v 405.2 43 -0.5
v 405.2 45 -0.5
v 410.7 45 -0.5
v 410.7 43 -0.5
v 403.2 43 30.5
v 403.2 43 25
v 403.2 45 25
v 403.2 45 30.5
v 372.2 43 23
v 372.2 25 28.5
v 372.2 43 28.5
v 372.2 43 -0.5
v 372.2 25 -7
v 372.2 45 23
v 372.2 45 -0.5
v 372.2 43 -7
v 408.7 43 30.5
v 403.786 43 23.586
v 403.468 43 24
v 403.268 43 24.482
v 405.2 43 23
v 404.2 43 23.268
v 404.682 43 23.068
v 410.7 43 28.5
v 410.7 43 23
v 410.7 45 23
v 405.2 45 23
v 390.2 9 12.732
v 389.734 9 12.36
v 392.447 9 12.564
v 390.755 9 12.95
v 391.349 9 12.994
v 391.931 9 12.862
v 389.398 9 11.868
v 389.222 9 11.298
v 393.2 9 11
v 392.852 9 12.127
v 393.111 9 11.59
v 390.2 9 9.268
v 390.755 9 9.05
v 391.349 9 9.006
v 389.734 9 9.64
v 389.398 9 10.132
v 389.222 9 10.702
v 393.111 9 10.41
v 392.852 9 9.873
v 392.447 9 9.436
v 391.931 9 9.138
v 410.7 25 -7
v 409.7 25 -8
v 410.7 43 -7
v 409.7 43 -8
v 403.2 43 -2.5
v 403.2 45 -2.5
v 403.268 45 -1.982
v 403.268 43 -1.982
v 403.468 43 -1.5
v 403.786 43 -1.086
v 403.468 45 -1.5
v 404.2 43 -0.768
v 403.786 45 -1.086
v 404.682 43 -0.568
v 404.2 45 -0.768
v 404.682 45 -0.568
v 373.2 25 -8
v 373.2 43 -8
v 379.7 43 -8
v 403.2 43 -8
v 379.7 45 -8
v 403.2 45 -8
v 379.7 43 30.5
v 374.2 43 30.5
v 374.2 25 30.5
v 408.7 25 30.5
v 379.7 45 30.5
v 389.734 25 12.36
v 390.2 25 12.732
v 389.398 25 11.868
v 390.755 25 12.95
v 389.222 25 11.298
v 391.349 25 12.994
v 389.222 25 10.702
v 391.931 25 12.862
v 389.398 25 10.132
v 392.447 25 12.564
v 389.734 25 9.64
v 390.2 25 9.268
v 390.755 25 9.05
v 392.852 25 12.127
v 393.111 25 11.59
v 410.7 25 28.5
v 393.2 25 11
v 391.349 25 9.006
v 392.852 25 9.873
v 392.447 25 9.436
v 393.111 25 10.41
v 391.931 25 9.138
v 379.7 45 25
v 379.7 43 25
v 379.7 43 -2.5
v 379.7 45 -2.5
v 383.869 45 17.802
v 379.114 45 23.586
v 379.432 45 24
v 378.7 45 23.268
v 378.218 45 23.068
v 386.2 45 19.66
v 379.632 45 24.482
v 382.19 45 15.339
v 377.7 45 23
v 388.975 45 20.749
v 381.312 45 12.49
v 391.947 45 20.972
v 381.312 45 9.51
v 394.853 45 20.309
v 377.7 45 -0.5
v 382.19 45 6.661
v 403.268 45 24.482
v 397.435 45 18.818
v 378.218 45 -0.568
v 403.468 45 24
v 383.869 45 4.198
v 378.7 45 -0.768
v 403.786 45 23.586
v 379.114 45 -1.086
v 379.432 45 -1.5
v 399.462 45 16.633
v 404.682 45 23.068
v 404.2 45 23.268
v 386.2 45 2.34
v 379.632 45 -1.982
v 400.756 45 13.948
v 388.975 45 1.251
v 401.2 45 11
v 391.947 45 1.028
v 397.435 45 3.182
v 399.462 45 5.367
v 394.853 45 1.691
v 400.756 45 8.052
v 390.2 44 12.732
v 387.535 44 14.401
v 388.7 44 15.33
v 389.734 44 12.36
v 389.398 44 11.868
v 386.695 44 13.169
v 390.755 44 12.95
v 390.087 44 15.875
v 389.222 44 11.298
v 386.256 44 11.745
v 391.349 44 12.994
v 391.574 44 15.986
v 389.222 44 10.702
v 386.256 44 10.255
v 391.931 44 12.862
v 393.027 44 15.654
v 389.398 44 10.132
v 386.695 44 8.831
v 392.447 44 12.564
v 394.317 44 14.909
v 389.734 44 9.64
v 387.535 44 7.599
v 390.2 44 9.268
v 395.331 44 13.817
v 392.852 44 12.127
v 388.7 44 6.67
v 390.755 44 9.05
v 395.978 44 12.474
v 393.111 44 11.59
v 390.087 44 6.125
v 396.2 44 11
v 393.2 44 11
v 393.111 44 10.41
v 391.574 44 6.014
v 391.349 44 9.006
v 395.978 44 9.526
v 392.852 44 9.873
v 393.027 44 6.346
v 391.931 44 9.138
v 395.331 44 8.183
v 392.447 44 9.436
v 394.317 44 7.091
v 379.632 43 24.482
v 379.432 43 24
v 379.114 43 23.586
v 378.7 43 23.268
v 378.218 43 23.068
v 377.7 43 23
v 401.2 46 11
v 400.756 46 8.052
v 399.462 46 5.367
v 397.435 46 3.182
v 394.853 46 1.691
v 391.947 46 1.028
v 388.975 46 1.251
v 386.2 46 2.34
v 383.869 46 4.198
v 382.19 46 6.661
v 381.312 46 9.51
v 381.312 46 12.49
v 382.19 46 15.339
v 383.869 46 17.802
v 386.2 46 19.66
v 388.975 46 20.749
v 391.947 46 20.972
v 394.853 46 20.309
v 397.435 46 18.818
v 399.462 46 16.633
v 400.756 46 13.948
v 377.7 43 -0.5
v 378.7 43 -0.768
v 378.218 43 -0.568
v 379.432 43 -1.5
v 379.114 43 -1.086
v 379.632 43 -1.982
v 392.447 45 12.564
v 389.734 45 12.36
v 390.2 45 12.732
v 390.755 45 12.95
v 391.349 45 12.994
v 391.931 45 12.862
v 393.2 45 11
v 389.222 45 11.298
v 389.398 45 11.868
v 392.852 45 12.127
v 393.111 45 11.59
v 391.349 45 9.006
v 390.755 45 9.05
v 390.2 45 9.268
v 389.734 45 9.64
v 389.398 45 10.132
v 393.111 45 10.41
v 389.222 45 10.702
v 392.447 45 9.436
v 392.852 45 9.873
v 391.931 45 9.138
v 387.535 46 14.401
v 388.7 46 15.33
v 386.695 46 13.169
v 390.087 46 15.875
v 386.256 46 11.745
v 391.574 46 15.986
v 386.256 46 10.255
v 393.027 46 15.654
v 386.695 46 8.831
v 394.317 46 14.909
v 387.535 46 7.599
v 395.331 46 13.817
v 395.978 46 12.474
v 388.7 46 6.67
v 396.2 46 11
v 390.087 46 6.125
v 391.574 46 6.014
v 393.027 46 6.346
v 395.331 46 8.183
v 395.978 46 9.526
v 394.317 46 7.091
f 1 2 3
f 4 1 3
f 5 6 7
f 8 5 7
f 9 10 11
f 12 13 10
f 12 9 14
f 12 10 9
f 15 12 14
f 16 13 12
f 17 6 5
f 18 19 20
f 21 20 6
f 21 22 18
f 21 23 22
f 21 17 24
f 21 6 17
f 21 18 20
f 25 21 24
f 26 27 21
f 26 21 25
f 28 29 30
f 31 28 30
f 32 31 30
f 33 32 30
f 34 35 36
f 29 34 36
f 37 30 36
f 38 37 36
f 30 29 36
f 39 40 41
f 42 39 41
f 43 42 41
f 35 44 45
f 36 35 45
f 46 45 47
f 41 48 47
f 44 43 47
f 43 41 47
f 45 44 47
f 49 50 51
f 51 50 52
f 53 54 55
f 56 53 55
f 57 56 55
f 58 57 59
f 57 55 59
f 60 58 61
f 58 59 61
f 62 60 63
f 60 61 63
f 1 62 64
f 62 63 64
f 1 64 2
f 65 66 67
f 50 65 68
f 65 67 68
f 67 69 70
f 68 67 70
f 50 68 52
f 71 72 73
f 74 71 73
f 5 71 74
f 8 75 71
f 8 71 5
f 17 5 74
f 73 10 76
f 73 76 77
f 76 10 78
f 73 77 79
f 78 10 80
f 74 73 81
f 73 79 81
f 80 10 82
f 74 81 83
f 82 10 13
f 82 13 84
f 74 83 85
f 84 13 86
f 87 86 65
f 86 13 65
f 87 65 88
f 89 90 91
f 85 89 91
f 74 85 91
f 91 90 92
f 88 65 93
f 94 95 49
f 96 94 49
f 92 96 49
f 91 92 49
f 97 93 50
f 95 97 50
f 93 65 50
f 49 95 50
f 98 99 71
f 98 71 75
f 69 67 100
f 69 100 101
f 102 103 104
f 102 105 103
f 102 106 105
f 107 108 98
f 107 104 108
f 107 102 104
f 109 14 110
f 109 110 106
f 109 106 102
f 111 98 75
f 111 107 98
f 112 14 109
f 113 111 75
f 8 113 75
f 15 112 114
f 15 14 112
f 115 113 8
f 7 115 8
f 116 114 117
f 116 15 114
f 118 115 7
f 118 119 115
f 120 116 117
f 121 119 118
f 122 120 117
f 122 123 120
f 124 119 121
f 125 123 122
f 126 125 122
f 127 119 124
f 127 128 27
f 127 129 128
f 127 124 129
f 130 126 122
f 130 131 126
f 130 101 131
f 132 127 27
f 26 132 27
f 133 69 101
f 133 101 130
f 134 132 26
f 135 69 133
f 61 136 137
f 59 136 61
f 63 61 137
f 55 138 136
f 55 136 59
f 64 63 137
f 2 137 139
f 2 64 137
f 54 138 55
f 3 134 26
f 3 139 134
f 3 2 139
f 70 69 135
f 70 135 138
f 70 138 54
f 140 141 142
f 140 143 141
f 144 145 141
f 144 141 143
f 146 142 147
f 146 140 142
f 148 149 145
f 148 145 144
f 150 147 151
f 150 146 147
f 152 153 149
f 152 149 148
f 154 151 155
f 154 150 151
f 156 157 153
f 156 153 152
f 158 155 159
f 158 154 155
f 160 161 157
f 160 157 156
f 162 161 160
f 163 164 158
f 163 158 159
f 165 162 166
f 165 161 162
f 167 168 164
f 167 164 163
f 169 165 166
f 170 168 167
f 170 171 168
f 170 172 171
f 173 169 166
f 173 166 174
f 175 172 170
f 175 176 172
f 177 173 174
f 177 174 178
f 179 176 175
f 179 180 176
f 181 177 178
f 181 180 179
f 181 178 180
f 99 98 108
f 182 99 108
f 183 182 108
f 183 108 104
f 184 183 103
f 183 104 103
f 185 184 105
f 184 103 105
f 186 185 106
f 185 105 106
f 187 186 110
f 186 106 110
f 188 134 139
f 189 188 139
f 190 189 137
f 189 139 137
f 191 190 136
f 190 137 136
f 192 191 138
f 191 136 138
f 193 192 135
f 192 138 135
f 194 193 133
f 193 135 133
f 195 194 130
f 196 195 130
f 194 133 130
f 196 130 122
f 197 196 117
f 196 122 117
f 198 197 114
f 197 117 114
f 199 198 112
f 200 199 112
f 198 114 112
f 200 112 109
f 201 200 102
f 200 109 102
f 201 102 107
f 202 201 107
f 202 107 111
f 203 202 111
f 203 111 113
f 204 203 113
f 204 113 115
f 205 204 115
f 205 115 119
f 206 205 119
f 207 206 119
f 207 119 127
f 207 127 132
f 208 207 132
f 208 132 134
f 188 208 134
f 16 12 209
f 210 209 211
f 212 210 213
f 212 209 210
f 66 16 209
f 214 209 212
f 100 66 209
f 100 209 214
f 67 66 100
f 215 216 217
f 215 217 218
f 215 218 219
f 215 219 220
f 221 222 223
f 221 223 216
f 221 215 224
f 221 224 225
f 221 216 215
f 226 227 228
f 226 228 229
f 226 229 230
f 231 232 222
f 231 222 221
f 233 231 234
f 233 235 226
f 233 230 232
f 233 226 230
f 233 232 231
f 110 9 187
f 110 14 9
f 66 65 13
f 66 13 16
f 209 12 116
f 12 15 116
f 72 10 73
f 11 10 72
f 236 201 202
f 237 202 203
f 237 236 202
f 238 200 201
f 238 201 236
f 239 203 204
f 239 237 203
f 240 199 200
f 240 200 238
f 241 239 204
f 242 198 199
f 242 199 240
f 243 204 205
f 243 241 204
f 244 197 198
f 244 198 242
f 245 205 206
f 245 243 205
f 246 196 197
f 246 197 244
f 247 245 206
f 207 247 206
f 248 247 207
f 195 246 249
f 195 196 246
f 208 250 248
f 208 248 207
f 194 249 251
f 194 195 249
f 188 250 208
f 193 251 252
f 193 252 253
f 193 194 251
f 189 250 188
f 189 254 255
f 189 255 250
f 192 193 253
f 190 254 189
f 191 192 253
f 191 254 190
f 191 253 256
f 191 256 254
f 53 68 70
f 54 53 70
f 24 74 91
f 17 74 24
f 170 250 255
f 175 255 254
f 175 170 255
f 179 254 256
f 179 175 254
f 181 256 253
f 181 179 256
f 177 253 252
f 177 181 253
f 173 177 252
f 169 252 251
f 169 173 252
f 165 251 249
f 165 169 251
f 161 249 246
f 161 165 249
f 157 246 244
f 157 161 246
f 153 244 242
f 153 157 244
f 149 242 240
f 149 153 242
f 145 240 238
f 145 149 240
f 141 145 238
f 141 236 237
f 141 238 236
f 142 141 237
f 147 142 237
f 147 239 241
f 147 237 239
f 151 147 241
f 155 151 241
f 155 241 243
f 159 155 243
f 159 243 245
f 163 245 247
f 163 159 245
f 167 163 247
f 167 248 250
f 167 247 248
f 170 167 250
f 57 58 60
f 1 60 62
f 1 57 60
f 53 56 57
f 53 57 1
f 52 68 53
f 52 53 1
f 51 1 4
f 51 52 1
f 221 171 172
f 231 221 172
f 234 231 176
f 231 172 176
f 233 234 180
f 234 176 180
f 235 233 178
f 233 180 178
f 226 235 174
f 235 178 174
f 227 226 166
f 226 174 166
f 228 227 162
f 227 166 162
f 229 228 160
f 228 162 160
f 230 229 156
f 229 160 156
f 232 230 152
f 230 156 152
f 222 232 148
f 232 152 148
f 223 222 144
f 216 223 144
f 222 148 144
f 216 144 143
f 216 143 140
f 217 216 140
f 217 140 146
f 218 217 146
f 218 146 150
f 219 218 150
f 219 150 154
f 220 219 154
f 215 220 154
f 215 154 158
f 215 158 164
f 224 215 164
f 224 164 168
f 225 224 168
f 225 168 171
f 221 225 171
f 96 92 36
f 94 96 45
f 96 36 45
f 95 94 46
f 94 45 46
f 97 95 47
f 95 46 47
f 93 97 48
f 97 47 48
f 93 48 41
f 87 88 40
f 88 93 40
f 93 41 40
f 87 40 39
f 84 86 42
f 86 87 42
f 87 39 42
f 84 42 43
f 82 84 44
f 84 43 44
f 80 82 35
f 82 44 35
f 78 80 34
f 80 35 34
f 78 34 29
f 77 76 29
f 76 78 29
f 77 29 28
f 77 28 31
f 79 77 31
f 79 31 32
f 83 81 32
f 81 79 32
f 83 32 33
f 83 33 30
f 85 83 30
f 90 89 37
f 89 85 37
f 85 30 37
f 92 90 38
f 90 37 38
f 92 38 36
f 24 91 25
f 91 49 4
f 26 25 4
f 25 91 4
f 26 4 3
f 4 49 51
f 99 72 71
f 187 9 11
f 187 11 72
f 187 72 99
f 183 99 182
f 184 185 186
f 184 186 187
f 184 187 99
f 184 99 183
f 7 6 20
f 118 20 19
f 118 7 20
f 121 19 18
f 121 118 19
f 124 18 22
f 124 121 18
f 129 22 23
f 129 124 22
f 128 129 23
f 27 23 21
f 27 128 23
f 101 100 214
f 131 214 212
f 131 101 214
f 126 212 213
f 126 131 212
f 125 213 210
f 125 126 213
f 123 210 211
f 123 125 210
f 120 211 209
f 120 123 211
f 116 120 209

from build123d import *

# Parameters (mm, degrees)
CYLINDER007_R          = 2
CYLINDER007_DEPTH      = 36
CYLINDER007_ROLL_ANGLE = -90
CYLINDER004_R          = 5
CYLINDER004_DEPTH      = 31
CYLINDER004_ROLL_ANGLE = -90
CYLINDER002_R          = 10
CYLINDER002_DEPTH      = 11
CYLINDER002_ROLL_ANGLE = -90
CYLINDER003_R          = 5
CYLINDER003_DEPTH      = 19
CYLINDER003_ROLL_ANGLE = -90
CYLINDER001_R          = 5
CYLINDER001_DEPTH      = 31
CYLINDER001_ROLL_ANGLE = -90
BOX015_W               = 7.5
BOX015_H               = 3
BOX015_DEPTH           = 7.5
FILLET001_R            = 2
BOX017_W               = 7.5
BOX017_H               = 3
BOX017_DEPTH           = 7.5
FILLET002_R            = 2
BOX016_W               = 7.5
BOX016_H               = 3
BOX016_DEPTH           = 7.5
FILLET003_R            = 2
BOX014_W               = 7.5
BOX014_H               = 3
BOX014_DEPTH           = 7.5
FILLET_R               = 2
BOX012_W               = 38.5
BOX012_H               = 20
BOX012_DEPTH           = 38.5
CHAMFER_SIZE           = 2
CHAMFER001_1_SIZE      = 2
CHAMFER001_2_SIZE      = 1


with BuildPart() as eje_motor001:
    # Cylinder007 → Cylinder007 (new body)
    with BuildSketch(Plane.XY):
        Circle(CYLINDER007_R)
    extrude(amount=CYLINDER007_DEPTH)


with BuildPart() as eje_motor001_1:
    # Cylinder007 roll: moved
    add(eje_motor001.part.rotate(Axis((0, 0, 0), (1, 0, 0)), CYLINDER007_ROLL_ANGLE))


with BuildPart() as eje_motor001_2:
    # Cylinder007 placement: moved
    add(eje_motor001_1.part.moved(Location((379, 9, 11))))


with BuildPart() as cilindro015:
    # Cylinder004 → Cylinder004 (new body)
    with BuildSketch(Plane.XY):
        Circle(CYLINDER004_R)
    extrude(amount=CYLINDER004_DEPTH)


with BuildPart() as cilindro015_1:
    # Cylinder004 roll: moved
    add(cilindro015.part.rotate(Axis((0, 0, 0), (1, 0, 0)), CYLINDER004_ROLL_ANGLE))


with BuildPart() as cilindro015_2:
    # Cylinder004 placement: moved
    add(cilindro015_1.part.moved(Location((379, 55, 11))))


with BuildPart() as arandeloa_motor:
    # Cylinder002 → Cylinder002 (new body)
    with BuildSketch(Plane.XY):
        Circle(CYLINDER002_R)
    extrude(amount=CYLINDER002_DEPTH)


with BuildPart() as arandeloa_motor_1:
    # Cylinder002 roll: moved
    add(arandeloa_motor.part.rotate(Axis((0, 0, 0), (1, 0, 0)), CYLINDER002_ROLL_ANGLE))


with BuildPart() as arandeloa_motor_2:
    # Cylinder002 placement: moved
    add(arandeloa_motor_1.part.moved(Location((379, 69, 11))))

    # Cut009: cut Cilindro015
    add(cilindro015_2.part, mode=Mode.SUBTRACT)


with BuildPart() as arandeloa_motor_3:
    # Cut009 placement: moved
    add(arandeloa_motor_2.part.moved(Location((0, -34, 0))))


with BuildPart() as dentro_motor:
    # Cylinder003 → Cylinder003 (new body)
    with BuildSketch(Plane.XY):
        Circle(CYLINDER003_R)
    extrude(amount=CYLINDER003_DEPTH)


with BuildPart() as dentro_motor_1:
    # Cylinder003 roll: moved
    add(dentro_motor.part.rotate(Axis((0, 0, 0), (1, 0, 0)), CYLINDER003_ROLL_ANGLE))


with BuildPart() as dentro_motor_2:
    # Cylinder003 placement: moved
    add(dentro_motor_1.part.moved(Location((379, 25, 11))))


with BuildPart() as cilindro012:
    # Cylinder001 → Cylinder001 (new body)
    with BuildSketch(Plane.XY):
        Circle(CYLINDER001_R)
    extrude(amount=CYLINDER001_DEPTH)


with BuildPart() as cilindro012_1:
    # Cylinder001 roll: moved
    add(cilindro012.part.rotate(Axis((0, 0, 0), (1, 0, 0)), CYLINDER001_ROLL_ANGLE))


with BuildPart() as cilindro012_2:
    # Cylinder001 placement: moved
    add(cilindro012_1.part.moved(Location((379, 21, 11))))


with BuildPart() as fillet001:
    # Box015 → Box015 (new body)
    with BuildSketch(Plane(origin=(391, 43, -8), x_dir=(1, 0, 0), z_dir=(0, 0, 1))):
        with Locations((3.75, 1.5)):
            Rectangle(BOX015_W, BOX015_H)
    extrude(amount=BOX015_DEPTH)

    # Fillet001
    fillet001_edges = [fillet001.edges().sort_by_distance(p)[0] for p in [
        (391, 44.5, -0.5),
    ]]
    fillet(fillet001_edges, radius=FILLET001_R)


with BuildPart() as fillet002:
    # Box017 → Box017 (new body)
    with BuildSketch(Plane(origin=(360, 43, -8), x_dir=(1, 0, 0), z_dir=(0, 0, 1))):
        with Locations((3.75, 1.5)):
            Rectangle(BOX017_W, BOX017_H)
    extrude(amount=BOX017_DEPTH)

    # Fillet002
    fillet002_edges = [fillet002.edges().sort_by_distance(p)[0] for p in [
        (367.5, 44.5, -0.5),
    ]]
    fillet(fillet002_edges, radius=FILLET002_R)


with BuildPart() as fillet003:
    # Box016 → Box016 (new body)
    with BuildSketch(Plane(origin=(360, 43, 23), x_dir=(1, 0, 0), z_dir=(0, 0, 1))):
        with Locations((3.75, 1.5)):
            Rectangle(BOX016_W, BOX016_H)
    extrude(amount=BOX016_DEPTH)

    # Fillet003
    fillet003_edges = [fillet003.edges().sort_by_distance(p)[0] for p in [
        (367.5, 44.5, 23),
    ]]
    fillet(fillet003_edges, radius=FILLET003_R)


with BuildPart() as fillet_body:
    # Box014 → Box014 (new body)
    with BuildSketch(Plane(origin=(391, 43, 23), x_dir=(1, 0, 0), z_dir=(0, 0, 1))):
        with Locations((3.75, 1.5)):
            Rectangle(BOX014_W, BOX014_H)
    extrude(amount=BOX014_DEPTH)

    # Fillet
    fillet_edges = [fillet_body.edges().sort_by_distance(p)[0] for p in [
        (391, 44.5, 23),
    ]]
    fillet(fillet_edges, radius=FILLET_R)


with BuildPart() as ejex_motor:
    # Box012 → Box012 (new body)
    with BuildSketch(Plane(origin=(360, 25, -8), x_dir=(1, 0, 0), z_dir=(0, 0, 1))):
        with Locations((19.25, 10)):
            Rectangle(BOX012_W, BOX012_H)
    extrude(amount=BOX012_DEPTH)

    # Chamfer
    chamfer_edges = [ejex_motor.edges().sort_by_distance(p)[0] for p in [
        (398.5, 35, 30.5),
    ]]
    chamfer(chamfer_edges, length=CHAMFER_SIZE)

    # Chamfer001 1
    chamfer001_1_edges = [ejex_motor.edges().sort_by_distance(p)[0] for p in [
        (360, 35, 30.5),
    ]]
    chamfer(chamfer001_1_edges, length=CHAMFER001_1_SIZE)

    # Chamfer001 2
    chamfer001_2_edges = [ejex_motor.edges().sort_by_distance(p)[0] for p in [
        (398.5, 35, -8),
        (360, 35, -8),
    ]]
    chamfer(chamfer001_2_edges, length=CHAMFER001_2_SIZE)

    # Cut005: cut Fillet body
    add(fillet_body.part, mode=Mode.SUBTRACT)

    # Cut006: cut Fillet003
    add(fillet003.part, mode=Mode.SUBTRACT)

    # Cut007: cut Fillet002
    add(fillet002.part, mode=Mode.SUBTRACT)

    # Cut008: cut Fillet001
    add(fillet001.part, mode=Mode.SUBTRACT)

    # Cut010: cut Cilindro012
    add(cilindro012_2.part, mode=Mode.SUBTRACT)

    # Fusion007: union arandeloa motor, dentro motor
    add(arandeloa_motor_3.part)
    add(dentro_motor_2.part)

    # Fusion006: union eje motor001
    add(eje_motor001_2.part)


with BuildPart() as ejex_motor_1:
    # Fusion006 placement: moved
    add(ejex_motor.part.moved(Location((12.2, 0, 0))))


solid = ejex_motor_1.part
